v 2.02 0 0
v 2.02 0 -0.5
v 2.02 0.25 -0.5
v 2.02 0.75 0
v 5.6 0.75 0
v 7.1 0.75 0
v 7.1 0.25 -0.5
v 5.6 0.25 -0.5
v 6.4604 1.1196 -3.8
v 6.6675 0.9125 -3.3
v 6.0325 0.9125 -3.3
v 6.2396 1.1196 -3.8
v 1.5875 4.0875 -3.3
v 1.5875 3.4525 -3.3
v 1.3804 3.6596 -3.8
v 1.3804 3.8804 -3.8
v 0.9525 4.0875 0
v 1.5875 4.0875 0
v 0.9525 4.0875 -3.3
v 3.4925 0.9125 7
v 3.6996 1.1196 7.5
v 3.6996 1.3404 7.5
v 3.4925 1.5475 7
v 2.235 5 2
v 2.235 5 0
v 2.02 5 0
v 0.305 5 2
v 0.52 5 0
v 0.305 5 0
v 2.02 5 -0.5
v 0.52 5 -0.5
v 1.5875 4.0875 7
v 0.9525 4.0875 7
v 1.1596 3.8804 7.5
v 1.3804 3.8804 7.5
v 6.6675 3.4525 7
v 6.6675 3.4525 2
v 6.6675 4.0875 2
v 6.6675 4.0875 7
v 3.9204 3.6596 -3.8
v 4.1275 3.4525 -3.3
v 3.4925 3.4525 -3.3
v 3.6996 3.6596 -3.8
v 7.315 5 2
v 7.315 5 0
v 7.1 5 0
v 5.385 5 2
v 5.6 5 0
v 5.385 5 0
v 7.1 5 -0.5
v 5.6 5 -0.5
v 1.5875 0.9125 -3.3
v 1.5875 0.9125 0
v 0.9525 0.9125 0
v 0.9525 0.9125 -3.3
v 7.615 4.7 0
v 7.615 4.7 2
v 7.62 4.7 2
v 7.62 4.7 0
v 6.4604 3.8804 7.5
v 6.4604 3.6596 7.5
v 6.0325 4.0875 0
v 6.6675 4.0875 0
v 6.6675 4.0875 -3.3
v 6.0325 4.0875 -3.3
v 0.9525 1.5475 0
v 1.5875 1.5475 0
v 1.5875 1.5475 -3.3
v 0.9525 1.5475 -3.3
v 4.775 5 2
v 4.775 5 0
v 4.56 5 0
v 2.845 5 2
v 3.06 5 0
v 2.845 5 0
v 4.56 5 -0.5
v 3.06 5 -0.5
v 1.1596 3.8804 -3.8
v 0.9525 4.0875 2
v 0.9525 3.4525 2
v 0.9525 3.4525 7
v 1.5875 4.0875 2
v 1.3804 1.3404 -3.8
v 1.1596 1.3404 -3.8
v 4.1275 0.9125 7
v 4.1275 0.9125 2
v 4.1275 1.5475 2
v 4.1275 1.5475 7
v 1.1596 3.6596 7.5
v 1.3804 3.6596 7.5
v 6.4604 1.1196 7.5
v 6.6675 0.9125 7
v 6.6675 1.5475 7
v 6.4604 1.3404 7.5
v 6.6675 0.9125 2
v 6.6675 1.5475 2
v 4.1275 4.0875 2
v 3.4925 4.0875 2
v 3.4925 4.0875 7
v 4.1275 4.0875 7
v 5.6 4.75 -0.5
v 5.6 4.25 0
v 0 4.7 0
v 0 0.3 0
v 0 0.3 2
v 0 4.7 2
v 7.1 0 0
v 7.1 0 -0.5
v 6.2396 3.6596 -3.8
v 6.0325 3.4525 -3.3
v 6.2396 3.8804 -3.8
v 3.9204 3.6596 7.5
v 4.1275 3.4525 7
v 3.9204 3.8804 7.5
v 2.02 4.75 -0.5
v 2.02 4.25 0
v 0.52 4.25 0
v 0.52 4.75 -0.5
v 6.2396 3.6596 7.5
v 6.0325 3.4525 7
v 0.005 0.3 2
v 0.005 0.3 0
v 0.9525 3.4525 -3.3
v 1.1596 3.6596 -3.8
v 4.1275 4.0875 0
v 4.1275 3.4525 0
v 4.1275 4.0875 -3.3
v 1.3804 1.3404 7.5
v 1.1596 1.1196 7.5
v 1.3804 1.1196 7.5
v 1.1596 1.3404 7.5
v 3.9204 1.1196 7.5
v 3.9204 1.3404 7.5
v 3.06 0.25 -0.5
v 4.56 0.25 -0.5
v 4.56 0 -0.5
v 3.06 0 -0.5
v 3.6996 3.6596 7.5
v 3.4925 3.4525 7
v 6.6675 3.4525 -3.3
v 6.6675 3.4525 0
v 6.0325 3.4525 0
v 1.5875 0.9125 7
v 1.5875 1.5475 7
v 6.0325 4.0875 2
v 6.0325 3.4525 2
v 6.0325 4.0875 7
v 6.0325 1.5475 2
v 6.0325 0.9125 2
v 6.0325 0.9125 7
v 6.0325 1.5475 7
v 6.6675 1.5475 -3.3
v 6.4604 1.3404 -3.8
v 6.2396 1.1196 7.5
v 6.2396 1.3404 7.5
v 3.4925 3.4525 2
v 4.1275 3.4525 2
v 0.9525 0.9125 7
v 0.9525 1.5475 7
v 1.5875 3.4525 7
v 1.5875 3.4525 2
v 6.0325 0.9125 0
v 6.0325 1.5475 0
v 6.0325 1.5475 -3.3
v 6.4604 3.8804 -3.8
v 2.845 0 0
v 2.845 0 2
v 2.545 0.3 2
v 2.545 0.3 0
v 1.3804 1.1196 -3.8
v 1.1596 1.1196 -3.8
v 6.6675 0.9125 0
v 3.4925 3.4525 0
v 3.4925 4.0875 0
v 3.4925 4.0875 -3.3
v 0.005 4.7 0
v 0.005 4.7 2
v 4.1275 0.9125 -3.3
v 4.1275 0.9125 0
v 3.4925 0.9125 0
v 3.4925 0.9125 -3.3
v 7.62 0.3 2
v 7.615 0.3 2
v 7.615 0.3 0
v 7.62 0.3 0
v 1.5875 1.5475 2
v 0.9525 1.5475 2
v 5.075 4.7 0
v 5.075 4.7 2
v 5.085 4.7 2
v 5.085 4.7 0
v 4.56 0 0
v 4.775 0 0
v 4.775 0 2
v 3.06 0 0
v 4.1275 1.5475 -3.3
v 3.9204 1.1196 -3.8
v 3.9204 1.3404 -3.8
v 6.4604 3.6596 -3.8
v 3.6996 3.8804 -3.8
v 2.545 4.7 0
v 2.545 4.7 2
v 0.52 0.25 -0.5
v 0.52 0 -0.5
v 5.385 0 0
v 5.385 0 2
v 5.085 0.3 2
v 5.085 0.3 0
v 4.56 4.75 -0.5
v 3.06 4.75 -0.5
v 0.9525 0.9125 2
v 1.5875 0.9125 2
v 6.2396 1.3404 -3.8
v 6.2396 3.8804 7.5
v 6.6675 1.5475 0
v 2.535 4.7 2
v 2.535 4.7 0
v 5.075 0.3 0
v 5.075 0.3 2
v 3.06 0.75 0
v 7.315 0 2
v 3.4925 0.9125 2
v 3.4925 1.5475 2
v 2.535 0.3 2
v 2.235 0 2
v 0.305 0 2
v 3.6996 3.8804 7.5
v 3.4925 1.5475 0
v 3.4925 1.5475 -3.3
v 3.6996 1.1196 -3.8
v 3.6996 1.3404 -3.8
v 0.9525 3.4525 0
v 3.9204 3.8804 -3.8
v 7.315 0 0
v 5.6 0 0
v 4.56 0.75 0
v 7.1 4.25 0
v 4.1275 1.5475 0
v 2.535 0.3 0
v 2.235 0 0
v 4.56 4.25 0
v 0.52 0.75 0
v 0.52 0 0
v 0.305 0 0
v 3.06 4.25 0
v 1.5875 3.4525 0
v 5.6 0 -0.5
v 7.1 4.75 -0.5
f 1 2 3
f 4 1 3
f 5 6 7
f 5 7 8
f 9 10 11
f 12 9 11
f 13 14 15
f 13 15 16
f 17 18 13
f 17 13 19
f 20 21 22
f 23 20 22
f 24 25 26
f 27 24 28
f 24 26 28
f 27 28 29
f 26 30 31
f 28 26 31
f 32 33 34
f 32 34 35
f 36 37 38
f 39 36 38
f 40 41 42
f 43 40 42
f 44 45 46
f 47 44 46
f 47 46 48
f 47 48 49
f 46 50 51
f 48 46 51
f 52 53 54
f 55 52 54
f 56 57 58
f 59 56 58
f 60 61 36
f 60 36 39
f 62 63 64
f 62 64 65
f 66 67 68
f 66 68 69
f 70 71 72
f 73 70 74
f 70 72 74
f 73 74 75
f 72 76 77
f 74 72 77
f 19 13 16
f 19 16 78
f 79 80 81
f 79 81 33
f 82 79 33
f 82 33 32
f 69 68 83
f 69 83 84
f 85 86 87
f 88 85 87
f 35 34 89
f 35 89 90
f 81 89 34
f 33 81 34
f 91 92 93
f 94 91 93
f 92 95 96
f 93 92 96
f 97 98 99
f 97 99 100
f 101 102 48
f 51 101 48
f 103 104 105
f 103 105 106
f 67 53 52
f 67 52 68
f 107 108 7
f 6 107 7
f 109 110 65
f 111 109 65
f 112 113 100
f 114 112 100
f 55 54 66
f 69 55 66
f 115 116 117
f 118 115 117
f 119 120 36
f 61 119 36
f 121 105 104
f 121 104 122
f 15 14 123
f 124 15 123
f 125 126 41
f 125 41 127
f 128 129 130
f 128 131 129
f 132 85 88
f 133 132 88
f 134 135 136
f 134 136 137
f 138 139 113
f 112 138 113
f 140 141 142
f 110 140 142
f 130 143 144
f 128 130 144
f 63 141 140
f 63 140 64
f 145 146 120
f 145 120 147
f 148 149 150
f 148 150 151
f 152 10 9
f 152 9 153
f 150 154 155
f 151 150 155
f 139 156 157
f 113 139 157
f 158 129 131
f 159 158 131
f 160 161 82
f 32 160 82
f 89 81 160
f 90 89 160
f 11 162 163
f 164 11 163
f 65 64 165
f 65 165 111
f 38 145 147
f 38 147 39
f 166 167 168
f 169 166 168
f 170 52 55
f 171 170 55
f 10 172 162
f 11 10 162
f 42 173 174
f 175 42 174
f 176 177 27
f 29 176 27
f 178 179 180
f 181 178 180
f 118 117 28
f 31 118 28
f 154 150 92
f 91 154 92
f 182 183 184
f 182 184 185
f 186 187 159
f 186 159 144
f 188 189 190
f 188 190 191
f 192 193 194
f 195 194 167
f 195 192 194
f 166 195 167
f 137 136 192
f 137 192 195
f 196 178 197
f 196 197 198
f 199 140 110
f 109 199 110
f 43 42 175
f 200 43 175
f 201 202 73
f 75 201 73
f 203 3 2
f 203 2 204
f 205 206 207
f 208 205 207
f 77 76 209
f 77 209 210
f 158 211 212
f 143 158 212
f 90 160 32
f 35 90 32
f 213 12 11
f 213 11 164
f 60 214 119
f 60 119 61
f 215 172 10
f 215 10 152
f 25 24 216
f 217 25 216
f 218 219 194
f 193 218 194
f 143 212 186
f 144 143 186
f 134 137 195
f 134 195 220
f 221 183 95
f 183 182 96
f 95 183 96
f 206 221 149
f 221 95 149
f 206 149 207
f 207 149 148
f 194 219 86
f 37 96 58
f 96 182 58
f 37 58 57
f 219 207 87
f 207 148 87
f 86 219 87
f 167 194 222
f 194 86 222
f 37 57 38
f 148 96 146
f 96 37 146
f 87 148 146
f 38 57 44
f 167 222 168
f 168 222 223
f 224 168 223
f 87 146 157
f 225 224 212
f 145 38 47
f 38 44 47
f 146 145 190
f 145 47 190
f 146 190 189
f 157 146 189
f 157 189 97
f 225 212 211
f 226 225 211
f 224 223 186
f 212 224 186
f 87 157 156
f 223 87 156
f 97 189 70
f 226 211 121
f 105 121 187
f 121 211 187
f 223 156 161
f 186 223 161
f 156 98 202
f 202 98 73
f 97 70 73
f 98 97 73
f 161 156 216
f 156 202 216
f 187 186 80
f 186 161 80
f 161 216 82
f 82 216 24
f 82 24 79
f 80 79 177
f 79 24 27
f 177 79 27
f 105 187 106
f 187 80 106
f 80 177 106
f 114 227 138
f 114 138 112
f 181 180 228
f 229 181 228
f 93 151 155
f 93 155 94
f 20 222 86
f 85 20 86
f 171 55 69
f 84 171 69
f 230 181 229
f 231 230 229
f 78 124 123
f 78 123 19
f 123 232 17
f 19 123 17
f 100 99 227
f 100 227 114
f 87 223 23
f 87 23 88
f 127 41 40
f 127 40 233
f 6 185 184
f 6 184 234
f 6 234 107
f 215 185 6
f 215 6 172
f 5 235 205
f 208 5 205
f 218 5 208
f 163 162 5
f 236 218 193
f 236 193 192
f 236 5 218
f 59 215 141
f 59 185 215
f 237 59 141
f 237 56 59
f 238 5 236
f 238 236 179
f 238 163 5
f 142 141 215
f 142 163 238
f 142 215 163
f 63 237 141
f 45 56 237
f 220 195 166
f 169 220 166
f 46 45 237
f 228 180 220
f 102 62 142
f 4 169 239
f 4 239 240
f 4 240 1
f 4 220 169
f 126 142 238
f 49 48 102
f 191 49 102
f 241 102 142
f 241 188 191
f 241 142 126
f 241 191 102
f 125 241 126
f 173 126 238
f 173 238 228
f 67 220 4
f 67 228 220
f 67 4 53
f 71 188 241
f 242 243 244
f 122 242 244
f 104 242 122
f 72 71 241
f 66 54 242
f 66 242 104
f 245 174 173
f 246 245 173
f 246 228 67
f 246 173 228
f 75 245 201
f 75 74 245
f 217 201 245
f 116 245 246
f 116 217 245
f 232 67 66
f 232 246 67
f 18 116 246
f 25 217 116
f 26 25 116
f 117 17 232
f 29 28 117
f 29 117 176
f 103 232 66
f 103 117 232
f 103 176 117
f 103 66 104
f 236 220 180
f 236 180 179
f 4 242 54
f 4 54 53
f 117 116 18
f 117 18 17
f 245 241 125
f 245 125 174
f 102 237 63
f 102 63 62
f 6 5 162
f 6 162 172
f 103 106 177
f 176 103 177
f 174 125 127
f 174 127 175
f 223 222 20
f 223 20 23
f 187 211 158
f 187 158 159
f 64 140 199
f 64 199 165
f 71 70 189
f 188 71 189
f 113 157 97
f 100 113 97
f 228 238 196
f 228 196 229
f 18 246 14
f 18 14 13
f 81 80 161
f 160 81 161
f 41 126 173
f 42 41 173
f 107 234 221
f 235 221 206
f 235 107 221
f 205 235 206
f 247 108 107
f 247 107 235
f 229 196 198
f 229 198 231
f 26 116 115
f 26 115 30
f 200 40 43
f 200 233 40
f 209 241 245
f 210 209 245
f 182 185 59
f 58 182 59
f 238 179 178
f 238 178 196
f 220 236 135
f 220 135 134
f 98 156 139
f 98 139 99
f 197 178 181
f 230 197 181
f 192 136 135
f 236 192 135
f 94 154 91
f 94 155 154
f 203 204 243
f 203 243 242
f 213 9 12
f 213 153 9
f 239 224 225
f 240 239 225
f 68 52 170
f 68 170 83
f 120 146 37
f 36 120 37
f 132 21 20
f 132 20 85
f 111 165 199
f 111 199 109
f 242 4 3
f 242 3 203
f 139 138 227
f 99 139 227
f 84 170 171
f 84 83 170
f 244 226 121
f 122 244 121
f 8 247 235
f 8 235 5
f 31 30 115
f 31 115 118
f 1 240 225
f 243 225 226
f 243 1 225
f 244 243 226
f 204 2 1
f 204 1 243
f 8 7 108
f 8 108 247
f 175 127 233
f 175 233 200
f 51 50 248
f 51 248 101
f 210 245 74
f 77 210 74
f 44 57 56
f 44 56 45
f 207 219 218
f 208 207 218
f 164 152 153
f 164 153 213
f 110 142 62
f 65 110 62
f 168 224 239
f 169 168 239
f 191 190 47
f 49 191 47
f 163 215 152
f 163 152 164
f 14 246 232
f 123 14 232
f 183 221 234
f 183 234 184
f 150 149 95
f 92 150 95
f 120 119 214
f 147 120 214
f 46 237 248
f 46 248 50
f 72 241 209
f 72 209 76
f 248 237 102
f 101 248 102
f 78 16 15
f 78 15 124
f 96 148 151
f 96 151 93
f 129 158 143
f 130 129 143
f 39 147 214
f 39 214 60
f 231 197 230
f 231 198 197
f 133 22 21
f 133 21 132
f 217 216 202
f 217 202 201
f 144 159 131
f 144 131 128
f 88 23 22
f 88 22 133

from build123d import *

# Parameters (mm, degrees)
SKETCH1_W              = 7.62
SKETCH1_H              = 5
BOSS_EXTRUDE1_DEPTH    = 2
SKETCH2_W              = 0.305
SKETCH2_H              = 0.3
CUT_EXTRUDE1_DEPTH     = 3
CUT_EXTRUDE2_DEPTH     = 3
CUT_EXTRUDE3_DEPTH     = 3
SKETCH5_W              = 0.305
SKETCH5_H              = 0.3
CUT_EXTRUDE4_DEPTH     = 2
SKETCH6_W              = 0.305
SKETCH6_H              = 0.3
CUT_EXTRUDE5_DEPTH     = 3
CUT_EXTRUDE6_DEPTH     = 3
CUT_EXTRUDE7_DEPTH     = 3
SKETCH9_W              = 0.305
SKETCH9_H              = 0.3
CUT_EXTRUDE8_DEPTH     = 2
SKETCH10_W             = 0.635
SKETCH10_H             = 0.635
BOSS_EXTRUDE2_DEPTH    = 3.8
SKETCH11_W             = 0.635
SKETCH11_H             = 0.635
BOSS_EXTRUDE3_DEPTH    = 3.8
SKETCH12_W             = 0.635
SKETCH12_H             = 0.635
BOSS_EXTRUDE4_DEPTH    = 3.8
SKETCH13_W             = 0.635
SKETCH13_H             = 0.635
BOSS_EXTRUDE5_DEPTH    = 3.8
SKETCH14_W             = 0.635
SKETCH14_H             = 0.635
BOSS_EXTRUDE6_DEPTH    = 3.8
SKETCH15_W             = 1.5
SKETCH15_H             = 0.75
BOSS_EXTRUDE7_DEPTH    = 0.5
SKETCH16_W             = 1.5
SKETCH16_H             = 0.75
BOSS_EXTRUDE8_DEPTH    = 0.5
SKETCH17_W             = 1.5
SKETCH17_H             = 0.75
BOSS_EXTRUDE9_DEPTH    = 0.5
SKETCH18_W             = 1.5
SKETCH18_H             = 0.75
BOSS_EXTRUDE10_DEPTH   = 0.5
SKETCH19_W             = 1.5
SKETCH19_H             = 0.75
BOSS_EXTRUDE11_DEPTH   = 0.5
SKETCH20_W             = 1.5
SKETCH20_H             = 0.75
BOSS_EXTRUDE12_DEPTH   = 0.5
SKETCH21_W             = 0.635
SKETCH21_H             = 0.635
BOSS_EXTRUDE13_DEPTH   = 3.8
SKETCH22_W             = 0.635
SKETCH22_H             = 0.635
BOSS_EXTRUDE14_DEPTH   = 5.5
SKETCH23_W             = 0.635
SKETCH23_H             = 0.635
BOSS_EXTRUDE15_DEPTH   = 5.5
SKETCH24_W             = 0.635
SKETCH24_H             = 0.635
BOSS_EXTRUDE16_DEPTH   = 5.5
SKETCH25_W             = 0.635
SKETCH25_H             = 0.635
BOSS_EXTRUDE17_DEPTH   = 5.5
SKETCH26_W             = 0.635
SKETCH26_H             = 0.635
BOSS_EXTRUDE18_DEPTH   = 5.5
SKETCH27_W             = 0.635
SKETCH27_H             = 0.635
BOSS_EXTRUDE19_DEPTH   = 5.5
DRAFT1_ANGLE           = 45
DRAFT2_ANGLE           = 45
DRAFT3_ANGLE           = 45
DRAFT4_ANGLE           = 45
DRAFT5_ANGLE           = 45
CHAMFER1_SIZE          = 0.007071068
CHAMFER2_SIZE          = 0.207106781
CHAMFER2_SIZE2         = 0.5
CHAMFER2_PART_2_SIZE   = 0.207106781
CHAMFER2_PART_2_SIZE2  = 0.5
CHAMFER2_PART_3_SIZE   = 0.207106781
CHAMFER2_PART_3_SIZE2  = 0.5
CHAMFER2_PART_4_SIZE   = 0.207106781
CHAMFER2_PART_4_SIZE2  = 0.5
CHAMFER2_PART_5_SIZE   = 0.207106781
CHAMFER2_PART_5_SIZE2  = 0.5
CHAMFER2_PART_6_SIZE   = 0.207106781
CHAMFER2_PART_6_SIZE2  = 0.5
CHAMFER2_PART_7_SIZE   = 0.207106781
CHAMFER2_PART_7_SIZE2  = 0.5
CHAMFER2_PART_8_SIZE   = 0.207106781
CHAMFER2_PART_8_SIZE2  = 0.5
CHAMFER2_PART_9_SIZE   = 0.207106781
CHAMFER2_PART_9_SIZE2  = 0.5
CHAMFER2_PART_10_SIZE  = 0.207106781
CHAMFER2_PART_10_SIZE2 = 0.5
CHAMFER2_PART_11_SIZE  = 0.207106781
CHAMFER2_PART_11_SIZE2 = 0.5
CHAMFER2_PART_12_SIZE  = 0.207106781
CHAMFER2_PART_12_SIZE2 = 0.5


with BuildPart() as part:
    # Sketch1 → Boss-Extrude1 (new body)
    with BuildSketch(Plane(origin=(0, 0, 0), x_dir=(-1, 0, 0), z_dir=(0, 0, -1))):
        with Locations((-3.81, 2.5)):
            Rectangle(SKETCH1_W, SKETCH1_H)
    extrude(amount=-BOSS_EXTRUDE1_DEPTH)

    # Sketch2 → Cut-Extrude1 (cut, through all)
    with BuildSketch(Plane.XY.offset(2)):
        with Locations((7.4675, 0.15)):
            Rectangle(SKETCH2_W, SKETCH2_H)
    extrude(amount=-CUT_EXTRUDE1_DEPTH, mode=Mode.SUBTRACT)

    # Sketch3 → Cut-Extrude2 (cut, through all)
    with BuildSketch(Plane.XY.offset(2)):
        Polygon((4.775, 0), (5.385, 0), (5.385, 0.61), align=None)
    extrude(amount=-CUT_EXTRUDE2_DEPTH, mode=Mode.SUBTRACT)

    # Sketch4 → Cut-Extrude3 (cut, through all)
    with BuildSketch(Plane.XY.offset(2)):
        Polygon((2.235, 0), (2.845, 0), (2.235, 0.61), align=None)
    extrude(amount=-CUT_EXTRUDE3_DEPTH, mode=Mode.SUBTRACT)

    # Sketch5 → Cut-Extrude4 (cut)
    with BuildSketch(Plane.XY.offset(2)):
        with Locations((0.1525, 0.15)):
            Rectangle(SKETCH5_W, SKETCH5_H)
    extrude(amount=-CUT_EXTRUDE4_DEPTH, mode=Mode.SUBTRACT)

    # Sketch6 → Cut-Extrude5 (cut, through all)
    with BuildSketch(Plane.XY.offset(2)):
        with Locations((0.1525, 4.85)):
            Rectangle(SKETCH6_W, SKETCH6_H)
    extrude(amount=-CUT_EXTRUDE5_DEPTH, mode=Mode.SUBTRACT)

    # Sketch7 → Cut-Extrude6 (cut, through all)
    with BuildSketch(Plane.XY.offset(2)):
        Polygon((2.845, 5), (2.235, 5), (2.235, 4.39), align=None)
    extrude(amount=-CUT_EXTRUDE6_DEPTH, mode=Mode.SUBTRACT)

    # Sketch8 → Cut-Extrude7 (cut, through all)
    with BuildSketch(Plane.XY.offset(2)):
        Polygon((5.385, 5), (4.775, 5), (5.385, 4.39), align=None)
    extrude(amount=-CUT_EXTRUDE7_DEPTH, mode=Mode.SUBTRACT)

    # Sketch9 → Cut-Extrude8 (cut)
    with BuildSketch(Plane.XY.offset(2)):
        with Locations((7.4675, 4.85)):
            Rectangle(SKETCH9_W, SKETCH9_H)
    extrude(amount=-CUT_EXTRUDE8_DEPTH, mode=Mode.SUBTRACT)

    # Sketch10 → Boss-Extrude2 (add)
    with BuildSketch(Plane(origin=(0, 0, 0), x_dir=(-1, 0, 0), z_dir=(0, 0, -1))):
        with Locations((-6.35, 3.77)):
            Rectangle(SKETCH10_W, SKETCH10_H)
    extrude(amount=BOSS_EXTRUDE2_DEPTH)

    # Sketch11 → Boss-Extrude3 (add)
    with BuildSketch(Plane(origin=(0, 0, 0), x_dir=(-1, 0, 0), z_dir=(0, 0, -1))):
        with Locations((-6.35, 1.23)):
            Rectangle(SKETCH11_W, SKETCH11_H)
    extrude(amount=BOSS_EXTRUDE3_DEPTH)

    # Sketch12 → Boss-Extrude4 (add)
    with BuildSketch(Plane(origin=(0, 0, 0), x_dir=(-1, 0, 0), z_dir=(0, 0, -1))):
        with Locations((-3.81, 3.77)):
            Rectangle(SKETCH12_W, SKETCH12_H)
    extrude(amount=BOSS_EXTRUDE4_DEPTH)

    # Sketch13 → Boss-Extrude5 (add)
    with BuildSketch(Plane(origin=(0, 0, 0), x_dir=(-1, 0, 0), z_dir=(0, 0, -1))):
        with Locations((-3.81, 1.23)):
            Rectangle(SKETCH13_W, SKETCH13_H)
    extrude(amount=BOSS_EXTRUDE5_DEPTH)

    # Sketch14 → Boss-Extrude6 (add)
    with BuildSketch(Plane(origin=(0, 0, 0), x_dir=(-1, 0, 0), z_dir=(0, 0, -1))):
        with Locations((-1.27, 3.77)):
            Rectangle(SKETCH14_W, SKETCH14_H)
    extrude(amount=BOSS_EXTRUDE6_DEPTH)

    # Sketch15 → Boss-Extrude7 (add)
    with BuildSketch(Plane(origin=(0, 0, 0), x_dir=(-1, 0, 0), z_dir=(0, 0, -1))):
        with Locations((-6.35, 0.375)):
            Rectangle(SKETCH15_W, SKETCH15_H)
    extrude(amount=BOSS_EXTRUDE7_DEPTH)

    # Sketch16 → Boss-Extrude8 (add)
    with BuildSketch(Plane(origin=(0, 0, 0), x_dir=(-1, 0, 0), z_dir=(0, 0, -1))):
        with Locations((-3.81, 0.375)):
            Rectangle(SKETCH16_W, SKETCH16_H)
    extrude(amount=BOSS_EXTRUDE8_DEPTH)

    # Sketch17 → Boss-Extrude9 (add)
    with BuildSketch(Plane(origin=(0, 0, 0), x_dir=(-1, 0, 0), z_dir=(0, 0, -1))):
        with Locations((-1.27, 0.375)):
            Rectangle(SKETCH17_W, SKETCH17_H)
    extrude(amount=BOSS_EXTRUDE9_DEPTH)

    # Sketch18 → Boss-Extrude10 (add)
    with BuildSketch(Plane(origin=(0, 0, 0), x_dir=(-1, 0, 0), z_dir=(0, 0, -1))):
        with Locations((-1.27, 4.625)):
            Rectangle(SKETCH18_W, SKETCH18_H)
    extrude(amount=BOSS_EXTRUDE10_DEPTH)

    # Sketch19 → Boss-Extrude11 (add)
    with BuildSketch(Plane(origin=(0, 0, 0), x_dir=(-1, 0, 0), z_dir=(0, 0, -1))):
        with Locations((-3.81, 4.625)):
            Rectangle(SKETCH19_W, SKETCH19_H)
    extrude(amount=BOSS_EXTRUDE11_DEPTH)

    # Sketch20 → Boss-Extrude12 (add)
    with BuildSketch(Plane(origin=(0, 0, 0), x_dir=(-1, 0, 0), z_dir=(0, 0, -1))):
        with Locations((-6.35, 4.625)):
            Rectangle(SKETCH20_W, SKETCH20_H)
    extrude(amount=BOSS_EXTRUDE12_DEPTH)

    # Sketch21 → Boss-Extrude13 (add)
    with BuildSketch(Plane(origin=(0, 0, 0), x_dir=(-1, 0, 0), z_dir=(0, 0, -1))):
        with Locations((-1.27, 1.23)):
            Rectangle(SKETCH21_W, SKETCH21_H)
    extrude(amount=BOSS_EXTRUDE13_DEPTH)

    # Sketch22 → Boss-Extrude14 (add)
    with BuildSketch(Plane.XY.offset(2)):
        with Locations((6.35, 3.77)):
            Rectangle(SKETCH22_W, SKETCH22_H)
    extrude(amount=BOSS_EXTRUDE14_DEPTH)

    # Sketch23 → Boss-Extrude15 (add)
    with BuildSketch(Plane.XY.offset(2)):
        with Locations((6.35, 1.23)):
            Rectangle(SKETCH23_W, SKETCH23_H)
    extrude(amount=BOSS_EXTRUDE15_DEPTH)

    # Sketch24 → Boss-Extrude16 (add)
    with BuildSketch(Plane.XY.offset(2)):
        with Locations((3.81, 3.77)):
            Rectangle(SKETCH24_W, SKETCH24_H)
    extrude(amount=BOSS_EXTRUDE16_DEPTH)

    # Sketch25 → Boss-Extrude17 (add)
    with BuildSketch(Plane.XY.offset(2)):
        with Locations((3.81, 1.23)):
            Rectangle(SKETCH25_W, SKETCH25_H)
    extrude(amount=BOSS_EXTRUDE17_DEPTH)

    # Sketch26 → Boss-Extrude18 (add)
    with BuildSketch(Plane.XY.offset(2)):
        with Locations((1.27, 3.77)):
            Rectangle(SKETCH26_W, SKETCH26_H)
    extrude(amount=BOSS_EXTRUDE18_DEPTH)

    # Sketch27 → Boss-Extrude19 (add)
    with BuildSketch(Plane.XY.offset(2)):
        with Locations((1.27, 1.23)):
            Rectangle(SKETCH27_W, SKETCH27_H)
    extrude(amount=BOSS_EXTRUDE19_DEPTH)

    # Draft1
    draft1_faces = [part.faces().sort_by_distance(p)[0] for p in [
        (5.385, 0.305, 1),
        (7.315, 0.15, 1),
    ]]
    draft(draft1_faces, Plane(origin=(7.62, 0, 2), x_dir=(0, 0, -1), z_dir=(0, -1, 0)), DRAFT1_ANGLE)

    # Draft2
    draft2_faces = [part.faces().sort_by_distance(p)[0] for p in [
        (0.305, 0.15, 1),
        (2.235, 0.305, 1),
    ]]
    draft(draft2_faces, Plane(origin=(7.62, 0, 2), x_dir=(0, 0, -1), z_dir=(0, -1, 0)), DRAFT2_ANGLE)

    # Draft3
    draft3_faces = [part.faces().sort_by_distance(p)[0] for p in [
        (2.235, 4.695, 1),
        (0.305, 4.85, 1),
    ]]
    draft(draft3_faces, Plane(origin=(0, 5, 2), x_dir=(0, 0, 1), z_dir=(0, 1, 0)), DRAFT3_ANGLE)

    # Draft4
    draft4_faces = [part.faces().sort_by_distance(p)[0] for p in [
        (7.315, 4.85, 1),
        (5.385, 4.695, 1),
    ]]
    draft(draft4_faces, Plane(origin=(0, 5, 2), x_dir=(0, 0, 1), z_dir=(0, 1, 0)), DRAFT4_ANGLE)

    # Draft5
    draft5_faces = [part.faces().sort_by_distance(p)[0] for p in [
        (6.35, 0.75, -0.25),
        (3.81, 0.75, -0.25),
        (1.27, 0.75, -0.25),
        (1.27, 4.25, -0.25),
        (3.81, 4.25, -0.25),
        (6.35, 4.25, -0.25),
    ]]
    draft(draft5_faces, Plane(origin=(0, 0, 0), x_dir=(-1, 0, 0), z_dir=(0, 0, -1)), DRAFT5_ANGLE)

    # Chamfer1
    chamfer1_edges = [part.edges().sort_by_distance(p)[0] for p in [
        (5.08, 4.695, 1),
        (5.08, 0.305, 1),
        (2.54, 0.305, 1),
        (2.54, 4.695, 1),
    ]]
    chamfer(chamfer1_edges, length=CHAMFER1_SIZE)

    # Chamfer2
    chamfer2_edges = [part.edges().sort_by_distance(p)[0] for p in [
        (6.6675, 3.77, -3.8),
        (6.35, 3.4525, -3.8),
        (6.0325, 3.77, -3.8),
        (6.35, 4.0875, -3.8),
    ]]
    chamfer2_side = [part.faces().sort_by_distance(p)[0] for p in [
        (6.35, 3.77, -3.8),
    ]]
    chamfer(chamfer2_edges, length=CHAMFER2_SIZE, length2=CHAMFER2_SIZE2, reference=chamfer2_side[0])

    # Chamfer2 part 2
    chamfer2_part_2_edges = [part.edges().sort_by_distance(p)[0] for p in [
        (6.35, 0.9125, -3.8),
        (6.0325, 1.23, -3.8),
        (6.35, 1.5475, -3.8),
        (6.6675, 1.23, -3.8),
    ]]
    chamfer2_part_2_side = [part.faces().sort_by_distance(p)[0] for p in [
        (6.35, 1.23, -3.8),
    ]]
    chamfer(chamfer2_part_2_edges, length=CHAMFER2_PART_2_SIZE, length2=CHAMFER2_PART_2_SIZE2, reference=chamfer2_part_2_side[0])

    # Chamfer2 part 3
    chamfer2_part_3_edges = [part.edges().sort_by_distance(p)[0] for p in [
        (3.81, 3.4525, -3.8),
        (3.4925, 3.77, -3.8),
        (3.81, 4.0875, -3.8),
        (4.1275, 3.77, -3.8),
    ]]
    chamfer2_part_3_side = [part.faces().sort_by_distance(p)[0] for p in [
        (3.81, 3.77, -3.8),
    ]]
    chamfer(chamfer2_part_3_edges, length=CHAMFER2_PART_3_SIZE, length2=CHAMFER2_PART_3_SIZE2, reference=chamfer2_part_3_side[0])

    # Chamfer2 part 4
    chamfer2_part_4_edges = [part.edges().sort_by_distance(p)[0] for p in [
        (3.81, 0.9125, -3.8),
        (3.4925, 1.23, -3.8),
        (3.81, 1.5475, -3.8),
        (4.1275, 1.23, -3.8),
    ]]
    chamfer2_part_4_side = [part.faces().sort_by_distance(p)[0] for p in [
        (3.81, 1.23, -3.8),
    ]]
    chamfer(chamfer2_part_4_edges, length=CHAMFER2_PART_4_SIZE, length2=CHAMFER2_PART_4_SIZE2, reference=chamfer2_part_4_side[0])

    # Chamfer2 part 5
    chamfer2_part_5_edges = [part.edges().sort_by_distance(p)[0] for p in [
        (1.27, 4.0875, -3.8),
        (1.5875, 3.77, -3.8),
        (1.27, 3.4525, -3.8),
        (0.9525, 3.77, -3.8),
    ]]
    chamfer2_part_5_side = [part.faces().sort_by_distance(p)[0] for p in [
        (1.27, 3.77, -3.8),
    ]]
    chamfer(chamfer2_part_5_edges, length=CHAMFER2_PART_5_SIZE, length2=CHAMFER2_PART_5_SIZE2, reference=chamfer2_part_5_side[0])

    # Chamfer2 part 6
    chamfer2_part_6_edges = [part.edges().sort_by_distance(p)[0] for p in [
        (1.27, 0.9125, -3.8),
        (0.9525, 1.23, -3.8),
        (1.27, 1.5475, -3.8),
        (1.5875, 1.23, -3.8),
    ]]
    chamfer2_part_6_side = [part.faces().sort_by_distance(p)[0] for p in [
        (1.27, 1.23, -3.8),
    ]]
    chamfer(chamfer2_part_6_edges, length=CHAMFER2_PART_6_SIZE, length2=CHAMFER2_PART_6_SIZE2, reference=chamfer2_part_6_side[0])

    # Chamfer2 part 7
    chamfer2_part_7_edges = [part.edges().sort_by_distance(p)[0] for p in [
        (6.0325, 3.77, 7.5),
        (6.35, 3.4525, 7.5),
        (6.6675, 3.77, 7.5),
        (6.35, 4.0875, 7.5),
    ]]
    chamfer2_part_7_side = [part.faces().sort_by_distance(p)[0] for p in [
        (6.35, 3.77, 7.5),
    ]]
    chamfer(chamfer2_part_7_edges, length=CHAMFER2_PART_7_SIZE, length2=CHAMFER2_PART_7_SIZE2, reference=chamfer2_part_7_side[0])

    # Chamfer2 part 8
    chamfer2_part_8_edges = [part.edges().sort_by_distance(p)[0] for p in [
        (6.35, 0.9125, 7.5),
        (6.6675, 1.23, 7.5),
        (6.35, 1.5475, 7.5),
        (6.0325, 1.23, 7.5),
    ]]
    chamfer2_part_8_side = [part.faces().sort_by_distance(p)[0] for p in [
        (6.35, 1.23, 7.5),
    ]]
    chamfer(chamfer2_part_8_edges, length=CHAMFER2_PART_8_SIZE, length2=CHAMFER2_PART_8_SIZE2, reference=chamfer2_part_8_side[0])

    # Chamfer2 part 9
    chamfer2_part_9_edges = [part.edges().sort_by_distance(p)[0] for p in [
        (3.4925, 3.77, 7.5),
        (3.81, 3.4525, 7.5),
        (4.1275, 3.77, 7.5),
        (3.81, 4.0875, 7.5),
    ]]
    chamfer2_part_9_side = [part.faces().sort_by_distance(p)[0] for p in [
        (3.81, 3.77, 7.5),
    ]]
    chamfer(chamfer2_part_9_edges, length=CHAMFER2_PART_9_SIZE, length2=CHAMFER2_PART_9_SIZE2, reference=chamfer2_part_9_side[0])

    # Chamfer2 part 10
    chamfer2_part_10_edges = [part.edges().sort_by_distance(p)[0] for p in [
        (3.4925, 1.23, 7.5),
        (3.81, 0.9125, 7.5),
        (4.1275, 1.23, 7.5),
        (3.81, 1.5475, 7.5),
    ]]
    chamfer2_part_10_side = [part.faces().sort_by_distance(p)[0] for p in [
        (3.81, 1.23, 7.5),
    ]]
    chamfer(chamfer2_part_10_edges, length=CHAMFER2_PART_10_SIZE, length2=CHAMFER2_PART_10_SIZE2, reference=chamfer2_part_10_side[0])

    # Chamfer2 part 11
    chamfer2_part_11_edges = [part.edges().sort_by_distance(p)[0] for p in [
        (0.9525, 3.77, 7.5),
        (1.27, 3.4525, 7.5),
        (1.5875, 3.77, 7.5),
        (1.27, 4.0875, 7.5),
    ]]
    chamfer2_part_11_side = [part.faces().sort_by_distance(p)[0] for p in [
        (1.27, 3.77, 7.5),
    ]]
    chamfer(chamfer2_part_11_edges, length=CHAMFER2_PART_11_SIZE, length2=CHAMFER2_PART_11_SIZE2, reference=chamfer2_part_11_side[0])

    # Chamfer2 part 12
    chamfer2_part_12_edges = [part.edges().sort_by_distance(p)[0] for p in [
        (1.27, 0.9125, 7.5),
        (1.5875, 1.23, 7.5),
        (1.27, 1.5475, 7.5),
        (0.9525, 1.23, 7.5),
    ]]
    chamfer2_part_12_side = [part.faces().sort_by_distance(p)[0] for p in [
        (1.27, 1.23, 7.5),
    ]]
    chamfer(chamfer2_part_12_edges, length=CHAMFER2_PART_12_SIZE, length2=CHAMFER2_PART_12_SIZE2, reference=chamfer2_part_12_side[0])


solid = part.part
